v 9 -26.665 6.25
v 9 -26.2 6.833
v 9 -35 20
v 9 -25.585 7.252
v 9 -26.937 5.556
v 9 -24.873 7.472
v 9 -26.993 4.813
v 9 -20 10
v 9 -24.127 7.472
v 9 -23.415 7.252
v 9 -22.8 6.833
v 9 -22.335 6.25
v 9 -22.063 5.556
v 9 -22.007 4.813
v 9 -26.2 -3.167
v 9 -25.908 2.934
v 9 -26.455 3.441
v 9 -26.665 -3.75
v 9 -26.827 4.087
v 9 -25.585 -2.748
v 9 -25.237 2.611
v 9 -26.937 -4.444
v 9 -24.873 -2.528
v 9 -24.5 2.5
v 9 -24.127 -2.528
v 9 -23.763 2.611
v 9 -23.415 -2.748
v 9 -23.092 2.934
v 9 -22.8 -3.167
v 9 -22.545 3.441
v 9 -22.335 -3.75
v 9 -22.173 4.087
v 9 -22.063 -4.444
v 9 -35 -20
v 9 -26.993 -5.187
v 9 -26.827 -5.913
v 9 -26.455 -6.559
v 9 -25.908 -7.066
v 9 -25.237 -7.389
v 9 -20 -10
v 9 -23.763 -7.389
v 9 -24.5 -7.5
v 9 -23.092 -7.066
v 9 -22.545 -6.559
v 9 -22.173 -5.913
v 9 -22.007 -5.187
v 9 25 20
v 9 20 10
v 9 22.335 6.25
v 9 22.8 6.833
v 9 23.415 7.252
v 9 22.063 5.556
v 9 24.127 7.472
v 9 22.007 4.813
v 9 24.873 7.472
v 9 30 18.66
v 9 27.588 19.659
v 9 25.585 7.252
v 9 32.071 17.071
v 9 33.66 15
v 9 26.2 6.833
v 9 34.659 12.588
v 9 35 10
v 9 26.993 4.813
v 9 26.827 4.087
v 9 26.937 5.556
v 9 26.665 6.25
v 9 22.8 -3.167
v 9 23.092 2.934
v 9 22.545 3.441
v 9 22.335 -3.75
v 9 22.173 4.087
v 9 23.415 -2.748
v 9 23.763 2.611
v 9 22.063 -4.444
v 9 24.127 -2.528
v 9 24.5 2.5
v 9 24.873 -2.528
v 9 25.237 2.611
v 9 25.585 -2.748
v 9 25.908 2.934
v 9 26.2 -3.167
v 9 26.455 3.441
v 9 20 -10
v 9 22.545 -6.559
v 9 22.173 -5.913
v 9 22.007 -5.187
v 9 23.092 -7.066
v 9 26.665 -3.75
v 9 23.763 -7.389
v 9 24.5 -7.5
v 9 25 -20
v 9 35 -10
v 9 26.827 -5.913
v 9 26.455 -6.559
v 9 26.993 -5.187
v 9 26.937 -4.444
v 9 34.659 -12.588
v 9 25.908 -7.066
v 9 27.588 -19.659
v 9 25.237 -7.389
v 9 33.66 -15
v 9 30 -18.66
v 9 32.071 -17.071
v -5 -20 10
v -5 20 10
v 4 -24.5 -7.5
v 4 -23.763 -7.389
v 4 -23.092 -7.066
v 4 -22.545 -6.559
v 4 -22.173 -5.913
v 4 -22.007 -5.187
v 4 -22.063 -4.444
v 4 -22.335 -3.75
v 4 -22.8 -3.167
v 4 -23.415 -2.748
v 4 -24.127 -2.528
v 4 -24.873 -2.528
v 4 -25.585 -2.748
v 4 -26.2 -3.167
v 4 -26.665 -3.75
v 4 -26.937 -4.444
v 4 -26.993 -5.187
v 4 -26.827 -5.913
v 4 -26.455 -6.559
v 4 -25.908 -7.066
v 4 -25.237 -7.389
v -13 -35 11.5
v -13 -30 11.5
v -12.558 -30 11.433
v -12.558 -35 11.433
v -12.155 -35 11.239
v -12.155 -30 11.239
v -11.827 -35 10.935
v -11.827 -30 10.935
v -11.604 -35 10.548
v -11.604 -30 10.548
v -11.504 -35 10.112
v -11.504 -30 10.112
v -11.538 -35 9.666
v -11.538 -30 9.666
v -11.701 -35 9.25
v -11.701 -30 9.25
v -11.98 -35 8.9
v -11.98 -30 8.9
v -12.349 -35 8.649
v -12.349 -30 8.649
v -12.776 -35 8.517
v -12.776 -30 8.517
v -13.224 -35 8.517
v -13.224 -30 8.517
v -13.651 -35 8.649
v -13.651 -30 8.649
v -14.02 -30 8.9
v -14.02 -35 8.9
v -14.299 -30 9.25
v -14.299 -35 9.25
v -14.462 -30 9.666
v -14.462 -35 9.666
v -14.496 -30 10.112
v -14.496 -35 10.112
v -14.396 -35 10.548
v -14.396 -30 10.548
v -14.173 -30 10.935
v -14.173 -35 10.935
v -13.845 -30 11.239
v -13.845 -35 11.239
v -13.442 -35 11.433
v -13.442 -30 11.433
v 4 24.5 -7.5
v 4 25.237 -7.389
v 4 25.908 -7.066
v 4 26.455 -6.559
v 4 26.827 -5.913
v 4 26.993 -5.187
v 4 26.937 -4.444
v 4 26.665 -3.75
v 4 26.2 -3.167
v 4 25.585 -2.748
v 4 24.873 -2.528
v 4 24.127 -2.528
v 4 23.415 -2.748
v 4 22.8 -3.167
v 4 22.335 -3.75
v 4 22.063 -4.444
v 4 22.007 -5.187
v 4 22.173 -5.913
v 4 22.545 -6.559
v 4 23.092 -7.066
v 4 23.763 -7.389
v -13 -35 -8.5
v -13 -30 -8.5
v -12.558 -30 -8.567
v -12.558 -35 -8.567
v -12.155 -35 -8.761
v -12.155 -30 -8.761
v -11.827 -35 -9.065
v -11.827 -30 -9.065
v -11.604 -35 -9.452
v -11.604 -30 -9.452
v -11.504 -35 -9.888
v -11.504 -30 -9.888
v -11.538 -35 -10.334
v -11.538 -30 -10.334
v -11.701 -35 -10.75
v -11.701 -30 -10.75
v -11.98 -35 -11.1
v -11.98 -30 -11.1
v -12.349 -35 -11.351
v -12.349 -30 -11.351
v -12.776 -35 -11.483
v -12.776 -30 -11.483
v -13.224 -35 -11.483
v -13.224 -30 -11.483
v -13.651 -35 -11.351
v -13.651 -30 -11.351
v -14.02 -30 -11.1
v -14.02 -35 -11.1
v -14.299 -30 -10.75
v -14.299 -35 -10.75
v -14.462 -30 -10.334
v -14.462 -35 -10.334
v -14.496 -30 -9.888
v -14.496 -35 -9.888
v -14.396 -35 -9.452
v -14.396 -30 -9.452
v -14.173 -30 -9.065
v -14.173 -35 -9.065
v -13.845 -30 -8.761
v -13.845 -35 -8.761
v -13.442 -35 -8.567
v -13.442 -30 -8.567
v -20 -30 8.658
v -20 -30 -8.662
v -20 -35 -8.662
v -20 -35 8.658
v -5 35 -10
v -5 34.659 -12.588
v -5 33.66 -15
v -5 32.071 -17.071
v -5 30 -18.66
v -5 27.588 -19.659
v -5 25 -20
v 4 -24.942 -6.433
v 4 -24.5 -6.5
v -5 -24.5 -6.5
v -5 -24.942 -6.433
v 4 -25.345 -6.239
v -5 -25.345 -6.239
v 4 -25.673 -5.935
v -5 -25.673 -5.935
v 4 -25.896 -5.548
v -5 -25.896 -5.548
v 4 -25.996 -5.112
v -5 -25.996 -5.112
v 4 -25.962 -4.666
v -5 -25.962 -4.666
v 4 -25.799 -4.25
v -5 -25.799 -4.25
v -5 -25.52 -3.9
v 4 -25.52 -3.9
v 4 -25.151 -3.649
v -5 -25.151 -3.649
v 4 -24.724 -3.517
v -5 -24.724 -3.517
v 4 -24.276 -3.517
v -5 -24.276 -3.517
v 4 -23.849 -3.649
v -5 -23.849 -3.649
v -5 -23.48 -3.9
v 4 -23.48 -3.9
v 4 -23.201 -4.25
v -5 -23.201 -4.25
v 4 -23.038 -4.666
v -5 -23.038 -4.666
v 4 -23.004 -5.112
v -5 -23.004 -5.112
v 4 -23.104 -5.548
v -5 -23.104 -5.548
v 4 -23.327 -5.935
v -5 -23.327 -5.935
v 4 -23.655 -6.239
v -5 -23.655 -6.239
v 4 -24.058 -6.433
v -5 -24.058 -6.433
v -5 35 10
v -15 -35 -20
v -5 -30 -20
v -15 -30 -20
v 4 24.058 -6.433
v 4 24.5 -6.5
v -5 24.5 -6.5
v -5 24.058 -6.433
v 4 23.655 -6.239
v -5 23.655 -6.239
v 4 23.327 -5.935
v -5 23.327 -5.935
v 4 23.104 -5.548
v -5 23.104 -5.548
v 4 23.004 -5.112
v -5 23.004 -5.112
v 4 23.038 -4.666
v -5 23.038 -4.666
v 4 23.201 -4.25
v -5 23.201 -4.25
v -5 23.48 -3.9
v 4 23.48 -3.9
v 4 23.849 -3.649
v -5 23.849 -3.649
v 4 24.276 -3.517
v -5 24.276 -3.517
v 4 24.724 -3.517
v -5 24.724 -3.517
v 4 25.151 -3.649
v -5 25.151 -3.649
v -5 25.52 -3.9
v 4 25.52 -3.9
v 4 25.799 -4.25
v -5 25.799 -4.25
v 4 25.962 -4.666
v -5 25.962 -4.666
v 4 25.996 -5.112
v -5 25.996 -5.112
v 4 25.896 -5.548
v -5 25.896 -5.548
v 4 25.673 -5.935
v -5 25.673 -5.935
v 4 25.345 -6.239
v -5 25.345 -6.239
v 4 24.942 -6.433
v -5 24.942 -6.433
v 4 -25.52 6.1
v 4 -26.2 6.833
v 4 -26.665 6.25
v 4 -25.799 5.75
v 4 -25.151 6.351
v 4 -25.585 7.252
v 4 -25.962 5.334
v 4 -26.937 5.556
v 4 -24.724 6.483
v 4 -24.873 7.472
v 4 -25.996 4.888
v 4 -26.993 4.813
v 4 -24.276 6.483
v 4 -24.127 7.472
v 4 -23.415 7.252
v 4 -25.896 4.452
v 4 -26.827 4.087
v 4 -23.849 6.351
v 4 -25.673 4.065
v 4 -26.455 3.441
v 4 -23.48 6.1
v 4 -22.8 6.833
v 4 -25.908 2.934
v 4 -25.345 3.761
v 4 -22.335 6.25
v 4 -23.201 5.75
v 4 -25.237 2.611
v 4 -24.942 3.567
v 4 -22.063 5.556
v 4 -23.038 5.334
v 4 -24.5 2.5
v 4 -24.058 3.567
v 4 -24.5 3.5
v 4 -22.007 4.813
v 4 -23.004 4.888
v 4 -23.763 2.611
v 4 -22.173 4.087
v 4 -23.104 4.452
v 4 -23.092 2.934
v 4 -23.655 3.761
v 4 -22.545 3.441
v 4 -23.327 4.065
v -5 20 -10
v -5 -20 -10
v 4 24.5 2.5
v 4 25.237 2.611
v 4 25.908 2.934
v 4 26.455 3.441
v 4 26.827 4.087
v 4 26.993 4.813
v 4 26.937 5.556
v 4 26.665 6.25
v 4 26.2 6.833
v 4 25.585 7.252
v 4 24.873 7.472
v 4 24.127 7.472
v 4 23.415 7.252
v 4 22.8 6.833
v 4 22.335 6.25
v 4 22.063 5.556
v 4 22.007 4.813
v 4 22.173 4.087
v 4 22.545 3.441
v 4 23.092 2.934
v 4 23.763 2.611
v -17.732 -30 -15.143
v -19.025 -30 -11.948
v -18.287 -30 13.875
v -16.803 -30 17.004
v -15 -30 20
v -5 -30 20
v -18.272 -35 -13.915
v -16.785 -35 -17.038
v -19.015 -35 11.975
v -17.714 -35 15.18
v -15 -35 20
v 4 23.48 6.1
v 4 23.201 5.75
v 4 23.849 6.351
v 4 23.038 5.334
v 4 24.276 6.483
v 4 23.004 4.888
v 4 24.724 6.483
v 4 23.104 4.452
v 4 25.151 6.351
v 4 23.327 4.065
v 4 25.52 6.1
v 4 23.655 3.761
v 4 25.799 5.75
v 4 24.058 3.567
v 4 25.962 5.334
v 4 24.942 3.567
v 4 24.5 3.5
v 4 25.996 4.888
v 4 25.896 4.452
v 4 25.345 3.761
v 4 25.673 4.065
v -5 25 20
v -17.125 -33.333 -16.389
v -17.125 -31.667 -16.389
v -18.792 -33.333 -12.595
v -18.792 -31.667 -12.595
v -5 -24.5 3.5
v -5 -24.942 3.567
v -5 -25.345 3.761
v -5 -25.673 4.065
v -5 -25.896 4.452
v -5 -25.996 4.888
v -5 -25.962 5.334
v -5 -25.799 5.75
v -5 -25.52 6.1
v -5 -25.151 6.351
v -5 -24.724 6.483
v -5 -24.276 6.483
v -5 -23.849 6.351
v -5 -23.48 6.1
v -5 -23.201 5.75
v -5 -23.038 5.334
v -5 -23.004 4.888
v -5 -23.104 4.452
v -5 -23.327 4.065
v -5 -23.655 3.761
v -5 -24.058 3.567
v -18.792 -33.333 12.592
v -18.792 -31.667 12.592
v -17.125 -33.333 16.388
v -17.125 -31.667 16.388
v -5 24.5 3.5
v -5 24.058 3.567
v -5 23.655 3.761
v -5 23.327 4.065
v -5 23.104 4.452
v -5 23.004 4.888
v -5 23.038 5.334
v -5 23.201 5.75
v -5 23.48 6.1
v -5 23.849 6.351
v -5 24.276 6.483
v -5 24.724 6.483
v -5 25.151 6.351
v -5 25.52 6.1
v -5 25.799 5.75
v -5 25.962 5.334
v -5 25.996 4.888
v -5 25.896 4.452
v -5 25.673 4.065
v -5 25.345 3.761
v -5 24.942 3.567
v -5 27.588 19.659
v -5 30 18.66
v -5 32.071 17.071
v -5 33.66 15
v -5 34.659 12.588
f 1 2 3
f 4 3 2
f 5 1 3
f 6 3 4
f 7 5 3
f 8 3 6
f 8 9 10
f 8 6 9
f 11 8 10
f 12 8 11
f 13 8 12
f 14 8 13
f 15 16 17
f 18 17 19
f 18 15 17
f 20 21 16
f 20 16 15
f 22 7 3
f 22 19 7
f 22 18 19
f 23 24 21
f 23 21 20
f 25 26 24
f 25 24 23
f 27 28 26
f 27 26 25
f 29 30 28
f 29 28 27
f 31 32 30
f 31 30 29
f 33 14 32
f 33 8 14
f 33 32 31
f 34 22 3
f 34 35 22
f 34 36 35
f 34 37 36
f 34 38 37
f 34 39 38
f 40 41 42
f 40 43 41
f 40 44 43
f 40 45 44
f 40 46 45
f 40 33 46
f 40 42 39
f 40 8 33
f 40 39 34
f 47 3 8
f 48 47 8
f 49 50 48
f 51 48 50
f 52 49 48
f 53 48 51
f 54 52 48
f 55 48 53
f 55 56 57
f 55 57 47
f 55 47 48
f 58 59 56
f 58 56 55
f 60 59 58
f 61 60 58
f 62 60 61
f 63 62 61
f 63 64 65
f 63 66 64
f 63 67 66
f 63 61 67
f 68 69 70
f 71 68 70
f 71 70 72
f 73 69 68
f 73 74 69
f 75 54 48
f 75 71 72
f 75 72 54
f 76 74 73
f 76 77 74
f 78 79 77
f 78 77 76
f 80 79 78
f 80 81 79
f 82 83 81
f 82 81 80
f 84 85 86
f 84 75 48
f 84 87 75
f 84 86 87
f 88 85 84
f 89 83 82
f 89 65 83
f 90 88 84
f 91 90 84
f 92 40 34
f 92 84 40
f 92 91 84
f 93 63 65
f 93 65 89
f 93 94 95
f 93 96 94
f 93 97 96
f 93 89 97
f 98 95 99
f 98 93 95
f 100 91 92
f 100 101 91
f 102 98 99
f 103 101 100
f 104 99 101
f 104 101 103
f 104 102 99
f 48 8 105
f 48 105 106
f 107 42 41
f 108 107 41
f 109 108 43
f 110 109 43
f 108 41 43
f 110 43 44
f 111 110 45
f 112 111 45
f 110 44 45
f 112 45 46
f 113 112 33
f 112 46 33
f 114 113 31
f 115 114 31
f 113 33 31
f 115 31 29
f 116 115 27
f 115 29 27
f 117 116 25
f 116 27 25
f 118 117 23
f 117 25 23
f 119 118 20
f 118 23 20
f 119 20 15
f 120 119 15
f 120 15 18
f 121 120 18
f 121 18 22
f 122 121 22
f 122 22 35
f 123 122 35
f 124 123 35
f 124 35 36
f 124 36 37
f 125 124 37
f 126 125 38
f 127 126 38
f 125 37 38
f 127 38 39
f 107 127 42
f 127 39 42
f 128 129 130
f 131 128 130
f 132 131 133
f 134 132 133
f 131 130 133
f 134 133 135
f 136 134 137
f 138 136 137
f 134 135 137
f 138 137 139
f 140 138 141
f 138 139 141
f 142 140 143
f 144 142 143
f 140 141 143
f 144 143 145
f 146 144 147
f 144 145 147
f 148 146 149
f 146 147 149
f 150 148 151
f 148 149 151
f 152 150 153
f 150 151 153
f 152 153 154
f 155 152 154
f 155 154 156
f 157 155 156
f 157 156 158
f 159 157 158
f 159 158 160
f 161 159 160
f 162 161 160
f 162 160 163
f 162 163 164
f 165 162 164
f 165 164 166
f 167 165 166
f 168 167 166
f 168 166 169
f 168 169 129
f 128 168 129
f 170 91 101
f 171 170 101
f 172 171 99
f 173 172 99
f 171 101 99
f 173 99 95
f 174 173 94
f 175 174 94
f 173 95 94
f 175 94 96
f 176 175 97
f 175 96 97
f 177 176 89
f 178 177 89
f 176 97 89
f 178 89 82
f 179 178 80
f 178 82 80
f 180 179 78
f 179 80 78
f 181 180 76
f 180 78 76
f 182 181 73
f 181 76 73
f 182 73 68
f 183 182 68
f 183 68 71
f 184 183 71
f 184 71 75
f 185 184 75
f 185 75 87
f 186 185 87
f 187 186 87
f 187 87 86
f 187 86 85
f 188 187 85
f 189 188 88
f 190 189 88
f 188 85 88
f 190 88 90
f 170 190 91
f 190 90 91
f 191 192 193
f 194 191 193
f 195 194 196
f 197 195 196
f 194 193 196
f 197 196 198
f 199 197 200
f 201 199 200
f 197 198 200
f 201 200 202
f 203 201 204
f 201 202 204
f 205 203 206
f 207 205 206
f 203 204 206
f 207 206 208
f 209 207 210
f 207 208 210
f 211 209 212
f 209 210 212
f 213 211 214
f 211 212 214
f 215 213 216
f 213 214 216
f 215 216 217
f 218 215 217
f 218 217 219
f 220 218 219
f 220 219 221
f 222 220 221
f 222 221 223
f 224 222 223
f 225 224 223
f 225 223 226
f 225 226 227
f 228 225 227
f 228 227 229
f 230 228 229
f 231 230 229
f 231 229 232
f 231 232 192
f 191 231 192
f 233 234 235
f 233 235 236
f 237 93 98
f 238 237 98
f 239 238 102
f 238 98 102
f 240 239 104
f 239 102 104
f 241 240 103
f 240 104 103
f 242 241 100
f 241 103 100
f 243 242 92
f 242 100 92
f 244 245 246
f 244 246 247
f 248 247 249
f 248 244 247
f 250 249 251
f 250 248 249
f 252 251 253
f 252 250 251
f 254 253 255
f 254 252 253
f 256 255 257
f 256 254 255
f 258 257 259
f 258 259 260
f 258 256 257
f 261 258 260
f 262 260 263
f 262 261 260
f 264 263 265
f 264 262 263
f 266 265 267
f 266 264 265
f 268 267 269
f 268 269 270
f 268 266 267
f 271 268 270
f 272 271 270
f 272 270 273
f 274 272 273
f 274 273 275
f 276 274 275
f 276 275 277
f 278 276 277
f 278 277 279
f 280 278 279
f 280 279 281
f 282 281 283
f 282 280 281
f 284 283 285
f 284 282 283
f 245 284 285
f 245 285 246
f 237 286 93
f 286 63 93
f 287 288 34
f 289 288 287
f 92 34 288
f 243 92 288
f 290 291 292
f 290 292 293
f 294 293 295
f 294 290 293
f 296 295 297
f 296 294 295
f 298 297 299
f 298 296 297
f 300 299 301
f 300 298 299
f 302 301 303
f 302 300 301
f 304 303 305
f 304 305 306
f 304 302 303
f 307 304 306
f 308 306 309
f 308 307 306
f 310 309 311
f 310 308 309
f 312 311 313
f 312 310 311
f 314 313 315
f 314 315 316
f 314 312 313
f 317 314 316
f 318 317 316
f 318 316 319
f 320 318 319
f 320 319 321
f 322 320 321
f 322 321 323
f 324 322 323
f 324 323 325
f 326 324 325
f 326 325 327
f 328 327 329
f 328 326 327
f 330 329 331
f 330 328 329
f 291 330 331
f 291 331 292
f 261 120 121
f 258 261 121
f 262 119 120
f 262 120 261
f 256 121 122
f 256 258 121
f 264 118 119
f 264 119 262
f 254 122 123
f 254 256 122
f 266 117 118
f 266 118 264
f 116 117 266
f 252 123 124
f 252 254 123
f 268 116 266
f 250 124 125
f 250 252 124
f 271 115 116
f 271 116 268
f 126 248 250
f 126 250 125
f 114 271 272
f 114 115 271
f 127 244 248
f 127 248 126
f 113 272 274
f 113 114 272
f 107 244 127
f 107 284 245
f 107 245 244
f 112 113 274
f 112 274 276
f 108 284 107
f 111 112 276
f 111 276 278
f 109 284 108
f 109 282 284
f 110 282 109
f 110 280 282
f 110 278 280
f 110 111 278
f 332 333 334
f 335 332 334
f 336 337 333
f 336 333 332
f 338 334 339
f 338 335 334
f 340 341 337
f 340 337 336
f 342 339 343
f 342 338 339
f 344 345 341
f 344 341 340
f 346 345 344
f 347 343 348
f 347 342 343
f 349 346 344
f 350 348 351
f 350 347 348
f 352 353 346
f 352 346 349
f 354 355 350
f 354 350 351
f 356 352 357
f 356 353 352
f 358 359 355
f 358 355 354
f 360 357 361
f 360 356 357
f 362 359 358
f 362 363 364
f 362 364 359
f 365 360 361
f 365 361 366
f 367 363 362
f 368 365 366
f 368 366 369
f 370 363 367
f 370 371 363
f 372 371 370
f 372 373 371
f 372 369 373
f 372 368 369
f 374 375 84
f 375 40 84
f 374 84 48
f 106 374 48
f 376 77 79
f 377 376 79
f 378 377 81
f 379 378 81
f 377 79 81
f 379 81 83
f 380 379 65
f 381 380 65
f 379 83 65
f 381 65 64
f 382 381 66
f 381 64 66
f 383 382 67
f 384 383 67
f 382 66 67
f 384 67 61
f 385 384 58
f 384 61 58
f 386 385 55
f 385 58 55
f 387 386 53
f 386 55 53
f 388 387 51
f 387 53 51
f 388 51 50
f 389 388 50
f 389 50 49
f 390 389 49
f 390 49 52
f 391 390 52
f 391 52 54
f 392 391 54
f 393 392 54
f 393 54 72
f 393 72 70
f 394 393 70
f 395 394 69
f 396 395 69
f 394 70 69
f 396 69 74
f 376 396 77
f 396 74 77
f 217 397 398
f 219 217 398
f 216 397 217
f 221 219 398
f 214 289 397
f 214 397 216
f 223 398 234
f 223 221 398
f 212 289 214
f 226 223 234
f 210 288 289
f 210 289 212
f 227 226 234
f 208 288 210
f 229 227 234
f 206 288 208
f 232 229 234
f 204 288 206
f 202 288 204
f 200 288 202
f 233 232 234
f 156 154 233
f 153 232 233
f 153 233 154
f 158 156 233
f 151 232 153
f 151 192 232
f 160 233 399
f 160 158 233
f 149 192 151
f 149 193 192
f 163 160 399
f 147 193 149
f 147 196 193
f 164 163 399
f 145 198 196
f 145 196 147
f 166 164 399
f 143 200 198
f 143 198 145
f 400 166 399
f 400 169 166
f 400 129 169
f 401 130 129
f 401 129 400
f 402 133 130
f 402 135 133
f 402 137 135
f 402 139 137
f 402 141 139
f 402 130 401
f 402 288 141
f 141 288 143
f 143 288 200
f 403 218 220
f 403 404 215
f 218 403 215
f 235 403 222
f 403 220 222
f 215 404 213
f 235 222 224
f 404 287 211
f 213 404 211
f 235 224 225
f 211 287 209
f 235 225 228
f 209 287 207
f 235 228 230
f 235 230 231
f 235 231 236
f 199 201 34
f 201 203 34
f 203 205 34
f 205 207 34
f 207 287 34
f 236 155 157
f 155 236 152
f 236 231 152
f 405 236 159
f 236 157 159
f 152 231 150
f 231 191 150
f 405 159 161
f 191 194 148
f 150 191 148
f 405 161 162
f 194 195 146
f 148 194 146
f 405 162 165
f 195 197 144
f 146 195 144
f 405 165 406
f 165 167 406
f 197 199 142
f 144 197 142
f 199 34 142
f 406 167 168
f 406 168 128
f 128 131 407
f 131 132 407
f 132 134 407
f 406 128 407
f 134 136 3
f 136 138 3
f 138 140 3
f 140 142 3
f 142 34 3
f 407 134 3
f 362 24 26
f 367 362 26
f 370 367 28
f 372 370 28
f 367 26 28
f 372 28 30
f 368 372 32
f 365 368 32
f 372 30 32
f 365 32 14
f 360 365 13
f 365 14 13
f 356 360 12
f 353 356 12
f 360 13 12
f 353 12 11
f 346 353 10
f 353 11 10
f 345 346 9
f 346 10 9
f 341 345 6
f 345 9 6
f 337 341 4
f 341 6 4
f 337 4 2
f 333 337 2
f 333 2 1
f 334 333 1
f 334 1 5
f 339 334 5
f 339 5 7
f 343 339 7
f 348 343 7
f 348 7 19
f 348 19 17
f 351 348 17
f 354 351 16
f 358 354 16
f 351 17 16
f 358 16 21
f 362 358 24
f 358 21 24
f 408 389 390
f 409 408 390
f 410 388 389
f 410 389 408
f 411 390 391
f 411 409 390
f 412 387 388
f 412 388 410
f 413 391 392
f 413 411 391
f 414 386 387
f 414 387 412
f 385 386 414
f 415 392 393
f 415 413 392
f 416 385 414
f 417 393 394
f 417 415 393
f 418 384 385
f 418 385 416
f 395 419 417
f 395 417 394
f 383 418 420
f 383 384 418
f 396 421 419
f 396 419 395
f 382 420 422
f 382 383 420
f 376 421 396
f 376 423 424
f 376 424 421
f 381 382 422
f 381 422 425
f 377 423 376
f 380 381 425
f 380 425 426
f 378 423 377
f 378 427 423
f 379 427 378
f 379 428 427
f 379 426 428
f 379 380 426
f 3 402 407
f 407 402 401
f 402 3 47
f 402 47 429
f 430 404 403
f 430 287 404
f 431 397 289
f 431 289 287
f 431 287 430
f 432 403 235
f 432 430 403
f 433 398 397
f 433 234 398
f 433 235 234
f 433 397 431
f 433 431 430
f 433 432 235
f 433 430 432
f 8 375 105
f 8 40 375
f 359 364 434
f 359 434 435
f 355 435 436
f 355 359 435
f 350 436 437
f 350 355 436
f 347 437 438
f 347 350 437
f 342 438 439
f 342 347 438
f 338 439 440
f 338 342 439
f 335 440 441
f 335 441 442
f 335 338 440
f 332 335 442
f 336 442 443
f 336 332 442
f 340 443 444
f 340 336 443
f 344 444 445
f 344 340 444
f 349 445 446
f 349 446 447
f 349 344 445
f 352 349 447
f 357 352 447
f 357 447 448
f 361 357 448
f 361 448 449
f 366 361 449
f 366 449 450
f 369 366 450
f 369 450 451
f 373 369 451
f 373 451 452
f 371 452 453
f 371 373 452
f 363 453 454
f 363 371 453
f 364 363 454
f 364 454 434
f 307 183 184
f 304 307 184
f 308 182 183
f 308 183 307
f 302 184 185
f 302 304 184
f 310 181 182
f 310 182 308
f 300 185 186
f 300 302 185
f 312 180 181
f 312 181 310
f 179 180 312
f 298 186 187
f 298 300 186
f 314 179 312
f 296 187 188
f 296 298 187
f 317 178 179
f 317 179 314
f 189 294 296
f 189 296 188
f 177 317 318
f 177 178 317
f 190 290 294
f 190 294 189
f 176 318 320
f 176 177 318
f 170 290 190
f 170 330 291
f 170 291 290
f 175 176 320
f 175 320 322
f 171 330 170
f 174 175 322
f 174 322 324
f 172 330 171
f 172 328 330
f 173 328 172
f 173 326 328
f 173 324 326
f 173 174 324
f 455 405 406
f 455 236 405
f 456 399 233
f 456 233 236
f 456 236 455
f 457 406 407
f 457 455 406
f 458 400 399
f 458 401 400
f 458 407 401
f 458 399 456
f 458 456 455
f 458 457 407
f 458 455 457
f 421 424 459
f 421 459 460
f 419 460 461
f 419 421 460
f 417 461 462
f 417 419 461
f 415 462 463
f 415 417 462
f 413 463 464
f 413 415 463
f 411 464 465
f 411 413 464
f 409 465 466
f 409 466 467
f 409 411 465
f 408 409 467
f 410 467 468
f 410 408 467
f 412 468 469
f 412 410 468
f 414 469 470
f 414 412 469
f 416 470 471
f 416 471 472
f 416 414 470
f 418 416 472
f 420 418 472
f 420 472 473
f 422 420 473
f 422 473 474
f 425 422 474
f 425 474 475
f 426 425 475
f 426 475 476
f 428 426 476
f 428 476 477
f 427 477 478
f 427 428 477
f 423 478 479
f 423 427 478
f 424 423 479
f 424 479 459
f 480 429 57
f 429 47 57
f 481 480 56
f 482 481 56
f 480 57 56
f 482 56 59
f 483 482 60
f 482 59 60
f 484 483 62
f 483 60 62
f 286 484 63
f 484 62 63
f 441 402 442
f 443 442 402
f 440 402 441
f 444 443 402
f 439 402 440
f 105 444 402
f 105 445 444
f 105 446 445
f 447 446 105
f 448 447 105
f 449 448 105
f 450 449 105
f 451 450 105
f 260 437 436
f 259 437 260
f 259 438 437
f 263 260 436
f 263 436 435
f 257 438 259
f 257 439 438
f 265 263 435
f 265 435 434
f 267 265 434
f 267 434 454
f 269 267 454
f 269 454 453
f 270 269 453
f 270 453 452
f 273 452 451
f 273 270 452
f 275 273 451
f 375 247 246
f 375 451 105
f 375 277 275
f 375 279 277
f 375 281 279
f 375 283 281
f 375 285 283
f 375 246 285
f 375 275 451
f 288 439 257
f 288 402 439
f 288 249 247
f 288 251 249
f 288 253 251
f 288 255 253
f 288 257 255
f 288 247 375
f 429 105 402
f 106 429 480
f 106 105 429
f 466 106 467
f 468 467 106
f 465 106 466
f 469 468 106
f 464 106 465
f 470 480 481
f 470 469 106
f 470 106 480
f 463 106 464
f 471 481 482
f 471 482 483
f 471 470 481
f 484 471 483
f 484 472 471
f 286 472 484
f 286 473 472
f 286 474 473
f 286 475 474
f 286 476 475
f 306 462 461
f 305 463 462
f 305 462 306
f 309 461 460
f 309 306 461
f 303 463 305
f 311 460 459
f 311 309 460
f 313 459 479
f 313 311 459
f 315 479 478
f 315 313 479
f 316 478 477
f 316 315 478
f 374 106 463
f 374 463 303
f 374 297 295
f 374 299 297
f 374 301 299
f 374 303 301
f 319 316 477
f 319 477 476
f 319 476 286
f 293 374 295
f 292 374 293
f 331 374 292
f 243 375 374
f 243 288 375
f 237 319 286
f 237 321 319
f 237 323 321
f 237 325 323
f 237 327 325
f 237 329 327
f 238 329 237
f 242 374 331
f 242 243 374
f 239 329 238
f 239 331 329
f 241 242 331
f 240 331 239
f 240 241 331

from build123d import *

# Parameters (mm, degrees)
SKETCH1_W           = 40
SKETCH1_H           = 70
BOSS_EXTRUDE2_DEPTH = 9
SKETCH3_W           = 20
SKETCH3_H           = 40
CUT_EXTRUDE1_DEPTH  = 42.303752856
SKETCH4_R           = 1.5
CUT_EXTRUDE2_DEPTH  = 42.303752856
SKETCH6_W           = 40
SKETCH6_H           = 5
BOSS_EXTRUDE3_DEPTH = 15
CUT_EXTRUDE3_DEPTH  = 47.914816423
BOSS_EXTRUDE4_DEPTH = 40
SKETCH9_W           = 40
SKETCH9_H           = 5
BOSS_EXTRUDE5_DEPTH = 5
SKETCH10_R          = 1.5
CUT_EXTRUDE4_DEPTH  = 71.887234394
CUT_EXTRUDE5_DEPTH  = 71.887234394
SKETCH12_R          = 1.5
SKETCH12_W          = 20
SKETCH12_H          = 40
BOSS_EXTRUDE6_DEPTH = 3
BOSS_EXTRUDE7_DEPTH = 40
SKETCH14_R          = 1.5
SKETCH14_W          = 20
SKETCH14_H          = 40
BOSS_EXTRUDE8_DEPTH = 2
BOSS_EXTRUDE9_DEPTH = 40
SKETCH17_R          = 2.5
CUT_EXTRUDE6_DEPTH  = 5


with BuildPart() as part:
    # Sketch1 → Boss-Extrude2 (new body)
    with BuildSketch(Plane(origin=(0, 0, 0), x_dir=(0, 0, -1), z_dir=(1, 0, 0))):
        Rectangle(SKETCH1_W, SKETCH1_H)
    extrude(amount=BOSS_EXTRUDE2_DEPTH)

    # Sketch3 → Cut-Extrude1 (cut, through all)
    with BuildSketch(Plane.ZY):
        Rectangle(SKETCH3_W, SKETCH3_H)
    extrude(amount=-CUT_EXTRUDE1_DEPTH, mode=Mode.SUBTRACT)

    # Sketch4 → Cut-Extrude2 (cut, through all)
    with BuildSketch(Plane(origin=(9, 0, 0), x_dir=(0, 0, -1), z_dir=(1, 0, 0))):
        with Locations((-5, -24.5)):
            Circle(SKETCH4_R)
        with Locations((5, -24.5)):
            Circle(SKETCH4_R)
        with Locations((-5, 24.5)):
            Circle(SKETCH4_R)
        with Locations((5, 24.5)):
            Circle(SKETCH4_R)
    extrude(amount=-CUT_EXTRUDE2_DEPTH, mode=Mode.SUBTRACT)

    # Sketch6 → Boss-Extrude3 (add)
    with BuildSketch(Plane.ZY):
        with Locations((0, -32.5)):
            Rectangle(SKETCH6_W, SKETCH6_H)
    extrude(amount=BOSS_EXTRUDE3_DEPTH)

    # Sketch7 → Cut-Extrude3 (cut, through all)
    with BuildSketch(Plane(origin=(9, 0, 0), x_dir=(0, 0, -1), z_dir=(1, 0, 0))):
        with BuildLine():
            Line((-20, 25), (-20, 35))
            Line((-20, 35), (-10, 35))
            ThreePointArc((-10, 35), (-17.071067812, 32.071067812), (-20, 25))
        make_face()
        with BuildLine():
            Line((10, 35), (20, 35))
            Line((20, 35), (20, 25))
            ThreePointArc((20, 25), (17.071067812, 32.071067812), (10, 35))
        make_face()
    extrude(amount=-CUT_EXTRUDE3_DEPTH, mode=Mode.SUBTRACT)

    # Sketch8 → Boss-Extrude4 (add)
    with BuildSketch(Plane(origin=(0, 0, -20), x_dir=(-1, 0, 0), z_dir=(0, 0, -1))):
        Polygon((0, -27), (5, -30), (0, -30), align=None)
    extrude(amount=-BOSS_EXTRUDE4_DEPTH)

    # Sketch9 → Boss-Extrude5 (add)
    with BuildSketch(Plane.ZY.offset(15)):
        with Locations((0, -32.5)):
            Rectangle(SKETCH9_W, SKETCH9_H)
    extrude(amount=BOSS_EXTRUDE5_DEPTH)

    # Sketch10 → Cut-Extrude4 (cut, through all)
    with BuildSketch(Plane(origin=(0, -30, 0), x_dir=(1, 0, 0), z_dir=(0, 1, 0))):
        with Locations(Location((-13, 10, 0), (0, 0, 270))):
            Circle(SKETCH10_R)
        with Locations(Location((-13, -10, 0), (0, 0, 270))):
            Circle(SKETCH10_R)
    extrude(amount=-CUT_EXTRUDE4_DEPTH, mode=Mode.SUBTRACT)

    # Sketch11 → Cut-Extrude5 (cut, through all)
    with BuildSketch(Plane(origin=(0, -30, 0), x_dir=(1, 0, 0), z_dir=(0, 1, 0))):
        with BuildLine():
            add(Edge.make_bspline(
                [(-15, 20), (-17.354348957, 16.495802807), (-19.021015624, 12.650080232), (-20, 8.662193644)],
                knots=[0, 0, 0, 0, 0.292090214, 0.292090214, 0.292090214, 0.292090214], degree=3))
            Line((-15, 20), (-20, 20))
            Line((-20, 20), (-20, 8.662193644))
        make_face()
        with BuildLine():
            add(Edge.make_bspline(
                [(-20, -8.658433055), (-19.021015624, -12.647055954), (-17.354348957, -16.494032059), (-15, -20)],
                knots=[0.707909786, 0.707909786, 0.707909786, 0.707909786, 1, 1, 1, 1], degree=3))
            Line((-20, -8.658433055), (-20, -20))
            Line((-20, -20), (-15, -20))
        make_face()
    extrude(amount=-CUT_EXTRUDE5_DEPTH, mode=Mode.SUBTRACT)

    # Sketch12 → Boss-Extrude6 (add)
    with BuildSketch(Plane.ZY):
        with BuildLine():
            ThreePointArc((-10, 35), (-17.071067812, 32.071067812), (-20, 25))
            Line((-20, 25), (-20, -27))
            Line((-20, -27), (20, -27))
            Line((20, -27), (20, 25))
            ThreePointArc((20, 25), (17.071067812, 32.071067812), (10, 35))
            Line((10, 35), (-10, 35))
        make_face()
        with Locations(Location((-5, 24.5, 0), (0, 0, 180))):
            Circle(SKETCH12_R, mode=Mode.SUBTRACT)
        with Locations(Location((-5, -24.5, 0), (0, 0, 180))):
            Circle(SKETCH12_R, mode=Mode.SUBTRACT)
        with Locations(Location((5, 24.5, 0), (0, 0, 180))):
            Circle(SKETCH12_R, mode=Mode.SUBTRACT)
        with Locations(Location((5, -24.5, 0), (0, 0, 180))):
            Circle(SKETCH12_R, mode=Mode.SUBTRACT)
        Rectangle(SKETCH12_W, SKETCH12_H, mode=Mode.SUBTRACT)
    extrude(amount=BOSS_EXTRUDE6_DEPTH)

    # Sketch13 → Boss-Extrude7 (add)
    with BuildSketch(Plane(origin=(0, 0, -20), x_dir=(-1, 0, 0), z_dir=(0, 0, -1))):
        Polygon((3, -27), (5, -30), (0, -27), align=None)
    extrude(amount=-BOSS_EXTRUDE7_DEPTH)

    # Sketch14 → Boss-Extrude8 (add)
    with BuildSketch(Plane.ZY.offset(3)):
        with BuildLine():
            Line((-20, -27), (20, -27))
            Line((20, -27), (20, 25))
            ThreePointArc((20, 25), (17.071067812, 32.071067812), (10, 35))
            Line((10, 35), (-10, 35))
            ThreePointArc((-10, 35), (-17.071067812, 32.071067812), (-20, 25))
            Line((-20, 25), (-20, -27))
        make_face()
        with Locations(Location((-5, 24.5, 0), (0, 0, 180))):
            Circle(SKETCH14_R, mode=Mode.SUBTRACT)
        with Locations(Location((5, 24.5, 0), (0, 0, 180))):
            Circle(SKETCH14_R, mode=Mode.SUBTRACT)
        with Locations(Location((-5, -24.5, 0), (0, 0, 180))):
            Circle(SKETCH14_R, mode=Mode.SUBTRACT)
        with Locations(Location((5, -24.5, 0), (0, 0, 180))):
            Circle(SKETCH14_R, mode=Mode.SUBTRACT)
        Rectangle(SKETCH14_W, SKETCH14_H, mode=Mode.SUBTRACT)
    extrude(amount=BOSS_EXTRUDE8_DEPTH)

    # Sketch16 → Boss-Extrude9 (add)
    with BuildSketch(Plane(origin=(0, 0, -20), x_dir=(-1, 0, 0), z_dir=(0, 0, -1))):
        Polygon((5, -27), (3, -27), (5, -30), align=None)
    extrude(amount=-BOSS_EXTRUDE9_DEPTH)

    # Sketch17 → Cut-Extrude6 (cut)
    with BuildSketch(Plane(origin=(9, 0, 0), x_dir=(0, 0, -1), z_dir=(1, 0, 0))):
        with Locations((-5, 24.5)):
            Circle(SKETCH17_R)
        with Locations((5, 24.5)):
            Circle(SKETCH17_R)
        with Locations((-5, -24.5)):
            Circle(SKETCH17_R)
        with Locations((5, -24.5)):
            Circle(SKETCH17_R)
    extrude(amount=-CUT_EXTRUDE6_DEPTH, mode=Mode.SUBTRACT)


solid = part.part
